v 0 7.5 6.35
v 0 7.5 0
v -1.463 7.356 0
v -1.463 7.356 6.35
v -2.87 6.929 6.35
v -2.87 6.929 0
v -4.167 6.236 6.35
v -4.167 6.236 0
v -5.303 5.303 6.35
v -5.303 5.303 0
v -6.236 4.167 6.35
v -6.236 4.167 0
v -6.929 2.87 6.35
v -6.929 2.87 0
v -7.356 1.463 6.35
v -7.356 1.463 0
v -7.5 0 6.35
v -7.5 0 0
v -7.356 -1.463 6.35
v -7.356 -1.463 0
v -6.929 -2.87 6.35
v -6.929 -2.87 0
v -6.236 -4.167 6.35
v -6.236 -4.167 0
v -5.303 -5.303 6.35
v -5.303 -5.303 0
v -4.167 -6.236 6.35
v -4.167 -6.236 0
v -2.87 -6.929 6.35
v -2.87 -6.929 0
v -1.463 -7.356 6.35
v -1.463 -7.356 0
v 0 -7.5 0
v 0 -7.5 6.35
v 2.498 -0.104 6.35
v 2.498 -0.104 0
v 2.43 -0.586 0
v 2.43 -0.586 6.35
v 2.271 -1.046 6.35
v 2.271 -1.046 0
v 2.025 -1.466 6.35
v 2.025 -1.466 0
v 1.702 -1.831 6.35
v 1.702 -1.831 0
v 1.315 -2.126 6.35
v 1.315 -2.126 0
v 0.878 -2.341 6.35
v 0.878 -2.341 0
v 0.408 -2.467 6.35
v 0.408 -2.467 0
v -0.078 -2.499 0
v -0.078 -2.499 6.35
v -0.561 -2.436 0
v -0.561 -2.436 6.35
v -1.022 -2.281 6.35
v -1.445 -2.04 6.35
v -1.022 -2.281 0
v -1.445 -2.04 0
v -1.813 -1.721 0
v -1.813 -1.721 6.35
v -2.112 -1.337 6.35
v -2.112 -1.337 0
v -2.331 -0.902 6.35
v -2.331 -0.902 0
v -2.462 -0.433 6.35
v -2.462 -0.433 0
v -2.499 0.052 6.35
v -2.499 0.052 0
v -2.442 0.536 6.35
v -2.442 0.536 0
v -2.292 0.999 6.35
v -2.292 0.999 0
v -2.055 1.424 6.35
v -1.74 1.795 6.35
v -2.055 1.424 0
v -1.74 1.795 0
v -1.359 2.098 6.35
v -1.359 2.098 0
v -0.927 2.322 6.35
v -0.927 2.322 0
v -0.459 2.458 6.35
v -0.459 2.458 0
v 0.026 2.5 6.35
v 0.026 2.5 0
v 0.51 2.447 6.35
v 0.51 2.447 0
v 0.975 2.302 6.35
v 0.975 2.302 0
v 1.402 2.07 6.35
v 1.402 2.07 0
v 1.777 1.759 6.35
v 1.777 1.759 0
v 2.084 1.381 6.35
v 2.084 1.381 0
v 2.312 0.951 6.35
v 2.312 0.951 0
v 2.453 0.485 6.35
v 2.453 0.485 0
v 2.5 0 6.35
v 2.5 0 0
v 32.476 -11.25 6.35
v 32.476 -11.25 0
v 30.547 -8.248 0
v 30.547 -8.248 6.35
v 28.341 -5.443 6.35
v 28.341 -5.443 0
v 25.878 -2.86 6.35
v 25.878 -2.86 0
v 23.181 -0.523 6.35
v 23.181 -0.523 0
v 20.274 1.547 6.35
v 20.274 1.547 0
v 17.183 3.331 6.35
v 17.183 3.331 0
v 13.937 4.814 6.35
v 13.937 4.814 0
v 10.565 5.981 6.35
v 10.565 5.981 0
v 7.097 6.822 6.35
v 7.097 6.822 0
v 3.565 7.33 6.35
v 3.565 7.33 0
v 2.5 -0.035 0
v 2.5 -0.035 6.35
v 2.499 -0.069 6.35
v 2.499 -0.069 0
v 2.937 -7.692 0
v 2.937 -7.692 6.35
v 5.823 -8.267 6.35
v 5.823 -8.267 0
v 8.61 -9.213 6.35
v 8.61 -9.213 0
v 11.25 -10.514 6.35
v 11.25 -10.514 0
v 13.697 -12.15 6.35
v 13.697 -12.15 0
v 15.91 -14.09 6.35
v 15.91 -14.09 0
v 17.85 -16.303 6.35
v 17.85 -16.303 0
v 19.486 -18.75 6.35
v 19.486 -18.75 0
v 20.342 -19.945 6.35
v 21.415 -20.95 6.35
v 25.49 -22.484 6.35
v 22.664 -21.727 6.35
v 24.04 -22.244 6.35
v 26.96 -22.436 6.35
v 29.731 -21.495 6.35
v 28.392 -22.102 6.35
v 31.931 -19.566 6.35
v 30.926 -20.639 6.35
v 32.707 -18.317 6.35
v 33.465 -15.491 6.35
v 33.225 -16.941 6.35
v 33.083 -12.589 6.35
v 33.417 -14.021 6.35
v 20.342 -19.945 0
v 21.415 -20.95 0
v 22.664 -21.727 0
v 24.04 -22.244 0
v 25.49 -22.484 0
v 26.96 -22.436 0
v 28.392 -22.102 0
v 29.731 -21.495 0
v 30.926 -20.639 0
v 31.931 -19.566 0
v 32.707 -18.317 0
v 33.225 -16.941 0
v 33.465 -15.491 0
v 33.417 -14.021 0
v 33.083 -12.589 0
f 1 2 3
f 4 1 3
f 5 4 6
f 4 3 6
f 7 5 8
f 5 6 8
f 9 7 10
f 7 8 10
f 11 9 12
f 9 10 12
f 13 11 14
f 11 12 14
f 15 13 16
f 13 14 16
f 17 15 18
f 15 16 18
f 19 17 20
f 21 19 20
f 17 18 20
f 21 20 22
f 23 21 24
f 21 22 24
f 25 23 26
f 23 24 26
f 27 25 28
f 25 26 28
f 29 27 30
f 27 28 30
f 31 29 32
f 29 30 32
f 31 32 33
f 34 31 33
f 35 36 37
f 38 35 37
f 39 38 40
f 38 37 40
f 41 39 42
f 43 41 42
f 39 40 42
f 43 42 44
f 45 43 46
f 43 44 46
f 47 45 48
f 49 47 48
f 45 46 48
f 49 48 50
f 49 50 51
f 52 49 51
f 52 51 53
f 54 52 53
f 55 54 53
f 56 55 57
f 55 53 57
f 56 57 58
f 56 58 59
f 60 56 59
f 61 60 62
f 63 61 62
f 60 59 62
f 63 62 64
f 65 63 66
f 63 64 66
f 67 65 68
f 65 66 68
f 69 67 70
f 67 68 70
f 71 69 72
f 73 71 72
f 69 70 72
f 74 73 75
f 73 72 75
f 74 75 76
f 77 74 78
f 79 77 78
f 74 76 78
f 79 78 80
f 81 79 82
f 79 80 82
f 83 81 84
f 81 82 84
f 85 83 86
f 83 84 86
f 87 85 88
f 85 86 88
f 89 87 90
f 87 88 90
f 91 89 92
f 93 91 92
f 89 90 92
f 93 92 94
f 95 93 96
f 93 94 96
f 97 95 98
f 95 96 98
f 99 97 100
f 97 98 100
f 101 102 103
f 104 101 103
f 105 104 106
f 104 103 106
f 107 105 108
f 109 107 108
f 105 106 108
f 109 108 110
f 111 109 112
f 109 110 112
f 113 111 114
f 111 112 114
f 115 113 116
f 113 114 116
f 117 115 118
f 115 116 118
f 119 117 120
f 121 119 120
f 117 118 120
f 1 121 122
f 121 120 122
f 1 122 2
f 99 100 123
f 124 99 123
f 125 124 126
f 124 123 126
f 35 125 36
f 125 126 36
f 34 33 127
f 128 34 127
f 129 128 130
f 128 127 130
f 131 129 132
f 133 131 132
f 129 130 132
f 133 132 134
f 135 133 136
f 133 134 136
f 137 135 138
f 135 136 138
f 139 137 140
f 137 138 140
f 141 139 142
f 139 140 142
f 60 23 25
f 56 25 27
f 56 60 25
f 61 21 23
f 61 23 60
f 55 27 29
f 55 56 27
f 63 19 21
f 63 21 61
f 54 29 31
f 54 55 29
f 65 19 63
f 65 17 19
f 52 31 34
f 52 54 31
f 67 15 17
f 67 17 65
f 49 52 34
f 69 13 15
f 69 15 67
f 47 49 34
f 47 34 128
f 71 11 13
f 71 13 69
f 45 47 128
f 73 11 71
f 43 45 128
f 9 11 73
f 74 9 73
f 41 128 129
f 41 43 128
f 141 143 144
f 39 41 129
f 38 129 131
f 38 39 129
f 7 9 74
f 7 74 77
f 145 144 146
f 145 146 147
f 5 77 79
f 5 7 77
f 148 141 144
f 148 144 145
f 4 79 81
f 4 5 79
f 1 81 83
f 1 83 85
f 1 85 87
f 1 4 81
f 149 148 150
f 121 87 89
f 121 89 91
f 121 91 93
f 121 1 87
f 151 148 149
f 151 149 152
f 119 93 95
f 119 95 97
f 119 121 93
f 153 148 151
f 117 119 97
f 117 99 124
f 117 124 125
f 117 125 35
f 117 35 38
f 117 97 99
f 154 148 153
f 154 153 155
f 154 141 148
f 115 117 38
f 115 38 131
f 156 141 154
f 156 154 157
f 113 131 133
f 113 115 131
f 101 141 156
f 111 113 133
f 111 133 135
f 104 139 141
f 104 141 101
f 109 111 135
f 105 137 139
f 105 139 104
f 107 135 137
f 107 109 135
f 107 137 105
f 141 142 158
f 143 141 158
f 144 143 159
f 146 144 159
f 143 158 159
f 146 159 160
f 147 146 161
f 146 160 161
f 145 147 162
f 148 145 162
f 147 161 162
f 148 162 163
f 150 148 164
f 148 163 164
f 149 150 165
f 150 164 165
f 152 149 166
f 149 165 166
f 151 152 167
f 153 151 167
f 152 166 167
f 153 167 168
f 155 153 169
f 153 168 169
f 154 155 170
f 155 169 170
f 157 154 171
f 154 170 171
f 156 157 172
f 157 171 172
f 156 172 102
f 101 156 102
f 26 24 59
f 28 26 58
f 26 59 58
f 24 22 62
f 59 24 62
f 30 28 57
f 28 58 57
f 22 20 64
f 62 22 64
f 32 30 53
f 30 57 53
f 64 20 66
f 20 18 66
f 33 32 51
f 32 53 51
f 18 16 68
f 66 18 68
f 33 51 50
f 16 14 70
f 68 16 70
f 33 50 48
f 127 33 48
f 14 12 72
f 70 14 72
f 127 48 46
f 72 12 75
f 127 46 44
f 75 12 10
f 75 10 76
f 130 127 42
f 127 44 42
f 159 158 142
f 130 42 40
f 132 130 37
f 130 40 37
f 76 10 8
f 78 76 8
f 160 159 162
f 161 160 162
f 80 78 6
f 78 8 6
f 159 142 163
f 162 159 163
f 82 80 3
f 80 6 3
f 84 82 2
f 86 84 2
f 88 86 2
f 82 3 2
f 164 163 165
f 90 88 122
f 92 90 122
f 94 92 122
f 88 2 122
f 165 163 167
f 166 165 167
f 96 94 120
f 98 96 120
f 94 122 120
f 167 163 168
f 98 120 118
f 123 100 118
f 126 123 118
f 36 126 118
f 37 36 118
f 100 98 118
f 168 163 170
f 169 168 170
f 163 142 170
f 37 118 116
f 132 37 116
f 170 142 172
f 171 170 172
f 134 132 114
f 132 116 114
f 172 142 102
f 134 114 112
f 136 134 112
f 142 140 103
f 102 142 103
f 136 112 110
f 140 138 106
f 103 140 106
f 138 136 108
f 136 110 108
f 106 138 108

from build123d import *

# Parameters (mm, degrees)
F1_DEPTH = 6.35


# Not quite as in the source:
# - a length typed as a fraction of an inch, garbled in the dataset ("3 / 203.2 mm" for 3/8 in), is restored


with BuildPart() as f1:
    # F0 (on Top) → F1 (new body)
    with BuildSketch(Plane.XY):
        with BuildLine():
            ThreePointArc((0, 7.5), (-7.5, 0), (0, -7.5))
            ThreePointArc((0, -7.5), (11.25, -10.5144284149), (19.4855715851, -18.75))
            ThreePointArc((19.4855715851, -18.75), (29.7307621135, -21.4951905284), (32.4759526419, -11.25))
            ThreePointArc((32.4759526419, -11.25), (18.75, 2.4759526419), (0, 7.5))
        make_face()
        with BuildLine():
            ThreePointArc((2.4978289184, -0.1041666667), (-2.4994571707, 0.0520946447), (2.5, 0))
            ThreePointArc((2.5, 0), (2.4994571707, -0.0520946447), (2.4978289184, -0.1041666667))
        make_face(mode=Mode.SUBTRACT)
    extrude(amount=F1_DEPTH)


solid = f1.part
